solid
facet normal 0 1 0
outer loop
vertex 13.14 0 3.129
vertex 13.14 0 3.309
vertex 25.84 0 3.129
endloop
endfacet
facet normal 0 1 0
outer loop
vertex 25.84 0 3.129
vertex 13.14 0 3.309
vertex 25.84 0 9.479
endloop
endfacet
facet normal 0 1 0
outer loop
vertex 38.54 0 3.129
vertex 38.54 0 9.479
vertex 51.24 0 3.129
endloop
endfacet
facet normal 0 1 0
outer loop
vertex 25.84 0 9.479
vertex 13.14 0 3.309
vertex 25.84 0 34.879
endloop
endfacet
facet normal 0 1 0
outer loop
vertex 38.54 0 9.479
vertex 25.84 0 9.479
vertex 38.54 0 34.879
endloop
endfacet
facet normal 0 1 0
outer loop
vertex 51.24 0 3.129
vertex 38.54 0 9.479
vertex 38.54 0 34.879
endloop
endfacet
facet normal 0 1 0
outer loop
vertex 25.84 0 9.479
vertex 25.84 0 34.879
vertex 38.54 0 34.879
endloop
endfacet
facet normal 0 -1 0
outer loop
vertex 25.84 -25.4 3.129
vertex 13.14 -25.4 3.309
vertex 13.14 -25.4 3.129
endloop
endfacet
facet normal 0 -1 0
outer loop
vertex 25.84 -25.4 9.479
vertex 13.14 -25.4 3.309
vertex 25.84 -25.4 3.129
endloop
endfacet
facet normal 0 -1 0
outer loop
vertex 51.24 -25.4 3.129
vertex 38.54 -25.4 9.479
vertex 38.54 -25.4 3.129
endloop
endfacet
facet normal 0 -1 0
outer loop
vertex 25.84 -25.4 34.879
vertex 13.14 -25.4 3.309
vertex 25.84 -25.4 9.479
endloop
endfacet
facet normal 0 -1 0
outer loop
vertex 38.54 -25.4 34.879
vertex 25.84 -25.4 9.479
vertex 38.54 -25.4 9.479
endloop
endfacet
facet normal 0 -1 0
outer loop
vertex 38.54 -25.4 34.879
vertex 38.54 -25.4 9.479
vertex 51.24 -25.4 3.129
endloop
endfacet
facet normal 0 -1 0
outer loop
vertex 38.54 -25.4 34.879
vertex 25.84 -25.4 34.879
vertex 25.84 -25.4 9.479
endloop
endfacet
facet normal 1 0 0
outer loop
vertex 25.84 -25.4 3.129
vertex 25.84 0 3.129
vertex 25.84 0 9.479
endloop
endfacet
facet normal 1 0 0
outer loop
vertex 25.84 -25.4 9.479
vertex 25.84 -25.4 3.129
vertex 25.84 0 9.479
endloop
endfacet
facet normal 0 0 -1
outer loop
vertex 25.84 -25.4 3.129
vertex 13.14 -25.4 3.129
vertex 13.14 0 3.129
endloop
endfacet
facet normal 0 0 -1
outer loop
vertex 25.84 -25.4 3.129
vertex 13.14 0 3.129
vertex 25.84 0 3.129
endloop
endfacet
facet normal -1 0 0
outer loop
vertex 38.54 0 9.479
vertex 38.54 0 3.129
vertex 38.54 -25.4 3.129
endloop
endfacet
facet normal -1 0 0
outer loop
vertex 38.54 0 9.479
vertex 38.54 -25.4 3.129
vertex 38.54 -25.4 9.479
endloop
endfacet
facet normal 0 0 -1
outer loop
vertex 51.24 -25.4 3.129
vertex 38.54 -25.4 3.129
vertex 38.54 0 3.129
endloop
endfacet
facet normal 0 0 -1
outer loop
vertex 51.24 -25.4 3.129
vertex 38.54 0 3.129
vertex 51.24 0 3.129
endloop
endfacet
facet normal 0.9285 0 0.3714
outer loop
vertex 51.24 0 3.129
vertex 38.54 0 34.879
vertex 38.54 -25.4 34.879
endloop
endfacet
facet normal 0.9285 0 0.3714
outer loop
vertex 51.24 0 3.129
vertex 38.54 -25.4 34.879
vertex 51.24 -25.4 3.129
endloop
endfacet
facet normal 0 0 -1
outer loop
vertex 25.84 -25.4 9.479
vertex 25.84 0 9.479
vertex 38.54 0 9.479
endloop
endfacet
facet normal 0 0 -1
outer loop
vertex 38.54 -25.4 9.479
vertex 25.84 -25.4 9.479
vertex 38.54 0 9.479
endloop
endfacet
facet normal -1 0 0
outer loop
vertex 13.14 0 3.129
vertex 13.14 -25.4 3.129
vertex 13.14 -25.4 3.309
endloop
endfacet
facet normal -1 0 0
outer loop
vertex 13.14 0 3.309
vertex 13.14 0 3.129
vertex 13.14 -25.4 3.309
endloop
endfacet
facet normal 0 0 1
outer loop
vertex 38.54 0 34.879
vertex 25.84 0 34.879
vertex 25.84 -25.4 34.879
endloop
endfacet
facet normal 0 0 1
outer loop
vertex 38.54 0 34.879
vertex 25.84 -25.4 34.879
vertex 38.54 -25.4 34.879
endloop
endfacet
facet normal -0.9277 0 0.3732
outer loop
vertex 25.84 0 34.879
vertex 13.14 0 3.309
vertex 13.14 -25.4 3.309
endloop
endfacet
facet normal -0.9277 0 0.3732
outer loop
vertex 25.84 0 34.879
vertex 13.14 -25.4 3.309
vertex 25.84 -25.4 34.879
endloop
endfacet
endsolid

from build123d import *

# Parameters (mm, degrees)
F0_W     = 38.1
F0_H     = 31.75
F1_DEPTH = 25.4
F3_DEPTH = 25.4
F5_DEPTH = 25.4
F6_W     = 12.7
F6_H     = 6.35
F7_DEPTH = 25.4


with BuildPart() as f1:
    # F0 (on Front) → F1 (new body)
    with BuildSketch(Plane.XZ):
        with Locations((32.189709, 19.003802)):
            Rectangle(F0_W, F0_H)
    extrude(amount=F1_DEPTH)

    # F2 (on Front) → F3 (cut)
    with BuildSketch(Plane.XZ):
        Polygon((51.239709, 34.878802), (38.539709, 34.878802), (51.239709, 3.128802), align=None)
    extrude(amount=F3_DEPTH, mode=Mode.SUBTRACT)

    # F4 (on Front) → F5 (cut)
    with BuildSketch(Plane.XZ):
        Polygon((13.139709, 3.309423), (25.839709, 34.878802), (13.139709, 35.059423), align=None)
    extrude(amount=F5_DEPTH, mode=Mode.SUBTRACT)

    # F6 (on Front) → F7 (cut)
    with BuildSketch(Plane.XZ):
        with Locations((32.189709, 6.303802)):
            Rectangle(F6_W, F6_H)
    extrude(amount=F7_DEPTH, mode=Mode.SUBTRACT)


solid = f1.part
